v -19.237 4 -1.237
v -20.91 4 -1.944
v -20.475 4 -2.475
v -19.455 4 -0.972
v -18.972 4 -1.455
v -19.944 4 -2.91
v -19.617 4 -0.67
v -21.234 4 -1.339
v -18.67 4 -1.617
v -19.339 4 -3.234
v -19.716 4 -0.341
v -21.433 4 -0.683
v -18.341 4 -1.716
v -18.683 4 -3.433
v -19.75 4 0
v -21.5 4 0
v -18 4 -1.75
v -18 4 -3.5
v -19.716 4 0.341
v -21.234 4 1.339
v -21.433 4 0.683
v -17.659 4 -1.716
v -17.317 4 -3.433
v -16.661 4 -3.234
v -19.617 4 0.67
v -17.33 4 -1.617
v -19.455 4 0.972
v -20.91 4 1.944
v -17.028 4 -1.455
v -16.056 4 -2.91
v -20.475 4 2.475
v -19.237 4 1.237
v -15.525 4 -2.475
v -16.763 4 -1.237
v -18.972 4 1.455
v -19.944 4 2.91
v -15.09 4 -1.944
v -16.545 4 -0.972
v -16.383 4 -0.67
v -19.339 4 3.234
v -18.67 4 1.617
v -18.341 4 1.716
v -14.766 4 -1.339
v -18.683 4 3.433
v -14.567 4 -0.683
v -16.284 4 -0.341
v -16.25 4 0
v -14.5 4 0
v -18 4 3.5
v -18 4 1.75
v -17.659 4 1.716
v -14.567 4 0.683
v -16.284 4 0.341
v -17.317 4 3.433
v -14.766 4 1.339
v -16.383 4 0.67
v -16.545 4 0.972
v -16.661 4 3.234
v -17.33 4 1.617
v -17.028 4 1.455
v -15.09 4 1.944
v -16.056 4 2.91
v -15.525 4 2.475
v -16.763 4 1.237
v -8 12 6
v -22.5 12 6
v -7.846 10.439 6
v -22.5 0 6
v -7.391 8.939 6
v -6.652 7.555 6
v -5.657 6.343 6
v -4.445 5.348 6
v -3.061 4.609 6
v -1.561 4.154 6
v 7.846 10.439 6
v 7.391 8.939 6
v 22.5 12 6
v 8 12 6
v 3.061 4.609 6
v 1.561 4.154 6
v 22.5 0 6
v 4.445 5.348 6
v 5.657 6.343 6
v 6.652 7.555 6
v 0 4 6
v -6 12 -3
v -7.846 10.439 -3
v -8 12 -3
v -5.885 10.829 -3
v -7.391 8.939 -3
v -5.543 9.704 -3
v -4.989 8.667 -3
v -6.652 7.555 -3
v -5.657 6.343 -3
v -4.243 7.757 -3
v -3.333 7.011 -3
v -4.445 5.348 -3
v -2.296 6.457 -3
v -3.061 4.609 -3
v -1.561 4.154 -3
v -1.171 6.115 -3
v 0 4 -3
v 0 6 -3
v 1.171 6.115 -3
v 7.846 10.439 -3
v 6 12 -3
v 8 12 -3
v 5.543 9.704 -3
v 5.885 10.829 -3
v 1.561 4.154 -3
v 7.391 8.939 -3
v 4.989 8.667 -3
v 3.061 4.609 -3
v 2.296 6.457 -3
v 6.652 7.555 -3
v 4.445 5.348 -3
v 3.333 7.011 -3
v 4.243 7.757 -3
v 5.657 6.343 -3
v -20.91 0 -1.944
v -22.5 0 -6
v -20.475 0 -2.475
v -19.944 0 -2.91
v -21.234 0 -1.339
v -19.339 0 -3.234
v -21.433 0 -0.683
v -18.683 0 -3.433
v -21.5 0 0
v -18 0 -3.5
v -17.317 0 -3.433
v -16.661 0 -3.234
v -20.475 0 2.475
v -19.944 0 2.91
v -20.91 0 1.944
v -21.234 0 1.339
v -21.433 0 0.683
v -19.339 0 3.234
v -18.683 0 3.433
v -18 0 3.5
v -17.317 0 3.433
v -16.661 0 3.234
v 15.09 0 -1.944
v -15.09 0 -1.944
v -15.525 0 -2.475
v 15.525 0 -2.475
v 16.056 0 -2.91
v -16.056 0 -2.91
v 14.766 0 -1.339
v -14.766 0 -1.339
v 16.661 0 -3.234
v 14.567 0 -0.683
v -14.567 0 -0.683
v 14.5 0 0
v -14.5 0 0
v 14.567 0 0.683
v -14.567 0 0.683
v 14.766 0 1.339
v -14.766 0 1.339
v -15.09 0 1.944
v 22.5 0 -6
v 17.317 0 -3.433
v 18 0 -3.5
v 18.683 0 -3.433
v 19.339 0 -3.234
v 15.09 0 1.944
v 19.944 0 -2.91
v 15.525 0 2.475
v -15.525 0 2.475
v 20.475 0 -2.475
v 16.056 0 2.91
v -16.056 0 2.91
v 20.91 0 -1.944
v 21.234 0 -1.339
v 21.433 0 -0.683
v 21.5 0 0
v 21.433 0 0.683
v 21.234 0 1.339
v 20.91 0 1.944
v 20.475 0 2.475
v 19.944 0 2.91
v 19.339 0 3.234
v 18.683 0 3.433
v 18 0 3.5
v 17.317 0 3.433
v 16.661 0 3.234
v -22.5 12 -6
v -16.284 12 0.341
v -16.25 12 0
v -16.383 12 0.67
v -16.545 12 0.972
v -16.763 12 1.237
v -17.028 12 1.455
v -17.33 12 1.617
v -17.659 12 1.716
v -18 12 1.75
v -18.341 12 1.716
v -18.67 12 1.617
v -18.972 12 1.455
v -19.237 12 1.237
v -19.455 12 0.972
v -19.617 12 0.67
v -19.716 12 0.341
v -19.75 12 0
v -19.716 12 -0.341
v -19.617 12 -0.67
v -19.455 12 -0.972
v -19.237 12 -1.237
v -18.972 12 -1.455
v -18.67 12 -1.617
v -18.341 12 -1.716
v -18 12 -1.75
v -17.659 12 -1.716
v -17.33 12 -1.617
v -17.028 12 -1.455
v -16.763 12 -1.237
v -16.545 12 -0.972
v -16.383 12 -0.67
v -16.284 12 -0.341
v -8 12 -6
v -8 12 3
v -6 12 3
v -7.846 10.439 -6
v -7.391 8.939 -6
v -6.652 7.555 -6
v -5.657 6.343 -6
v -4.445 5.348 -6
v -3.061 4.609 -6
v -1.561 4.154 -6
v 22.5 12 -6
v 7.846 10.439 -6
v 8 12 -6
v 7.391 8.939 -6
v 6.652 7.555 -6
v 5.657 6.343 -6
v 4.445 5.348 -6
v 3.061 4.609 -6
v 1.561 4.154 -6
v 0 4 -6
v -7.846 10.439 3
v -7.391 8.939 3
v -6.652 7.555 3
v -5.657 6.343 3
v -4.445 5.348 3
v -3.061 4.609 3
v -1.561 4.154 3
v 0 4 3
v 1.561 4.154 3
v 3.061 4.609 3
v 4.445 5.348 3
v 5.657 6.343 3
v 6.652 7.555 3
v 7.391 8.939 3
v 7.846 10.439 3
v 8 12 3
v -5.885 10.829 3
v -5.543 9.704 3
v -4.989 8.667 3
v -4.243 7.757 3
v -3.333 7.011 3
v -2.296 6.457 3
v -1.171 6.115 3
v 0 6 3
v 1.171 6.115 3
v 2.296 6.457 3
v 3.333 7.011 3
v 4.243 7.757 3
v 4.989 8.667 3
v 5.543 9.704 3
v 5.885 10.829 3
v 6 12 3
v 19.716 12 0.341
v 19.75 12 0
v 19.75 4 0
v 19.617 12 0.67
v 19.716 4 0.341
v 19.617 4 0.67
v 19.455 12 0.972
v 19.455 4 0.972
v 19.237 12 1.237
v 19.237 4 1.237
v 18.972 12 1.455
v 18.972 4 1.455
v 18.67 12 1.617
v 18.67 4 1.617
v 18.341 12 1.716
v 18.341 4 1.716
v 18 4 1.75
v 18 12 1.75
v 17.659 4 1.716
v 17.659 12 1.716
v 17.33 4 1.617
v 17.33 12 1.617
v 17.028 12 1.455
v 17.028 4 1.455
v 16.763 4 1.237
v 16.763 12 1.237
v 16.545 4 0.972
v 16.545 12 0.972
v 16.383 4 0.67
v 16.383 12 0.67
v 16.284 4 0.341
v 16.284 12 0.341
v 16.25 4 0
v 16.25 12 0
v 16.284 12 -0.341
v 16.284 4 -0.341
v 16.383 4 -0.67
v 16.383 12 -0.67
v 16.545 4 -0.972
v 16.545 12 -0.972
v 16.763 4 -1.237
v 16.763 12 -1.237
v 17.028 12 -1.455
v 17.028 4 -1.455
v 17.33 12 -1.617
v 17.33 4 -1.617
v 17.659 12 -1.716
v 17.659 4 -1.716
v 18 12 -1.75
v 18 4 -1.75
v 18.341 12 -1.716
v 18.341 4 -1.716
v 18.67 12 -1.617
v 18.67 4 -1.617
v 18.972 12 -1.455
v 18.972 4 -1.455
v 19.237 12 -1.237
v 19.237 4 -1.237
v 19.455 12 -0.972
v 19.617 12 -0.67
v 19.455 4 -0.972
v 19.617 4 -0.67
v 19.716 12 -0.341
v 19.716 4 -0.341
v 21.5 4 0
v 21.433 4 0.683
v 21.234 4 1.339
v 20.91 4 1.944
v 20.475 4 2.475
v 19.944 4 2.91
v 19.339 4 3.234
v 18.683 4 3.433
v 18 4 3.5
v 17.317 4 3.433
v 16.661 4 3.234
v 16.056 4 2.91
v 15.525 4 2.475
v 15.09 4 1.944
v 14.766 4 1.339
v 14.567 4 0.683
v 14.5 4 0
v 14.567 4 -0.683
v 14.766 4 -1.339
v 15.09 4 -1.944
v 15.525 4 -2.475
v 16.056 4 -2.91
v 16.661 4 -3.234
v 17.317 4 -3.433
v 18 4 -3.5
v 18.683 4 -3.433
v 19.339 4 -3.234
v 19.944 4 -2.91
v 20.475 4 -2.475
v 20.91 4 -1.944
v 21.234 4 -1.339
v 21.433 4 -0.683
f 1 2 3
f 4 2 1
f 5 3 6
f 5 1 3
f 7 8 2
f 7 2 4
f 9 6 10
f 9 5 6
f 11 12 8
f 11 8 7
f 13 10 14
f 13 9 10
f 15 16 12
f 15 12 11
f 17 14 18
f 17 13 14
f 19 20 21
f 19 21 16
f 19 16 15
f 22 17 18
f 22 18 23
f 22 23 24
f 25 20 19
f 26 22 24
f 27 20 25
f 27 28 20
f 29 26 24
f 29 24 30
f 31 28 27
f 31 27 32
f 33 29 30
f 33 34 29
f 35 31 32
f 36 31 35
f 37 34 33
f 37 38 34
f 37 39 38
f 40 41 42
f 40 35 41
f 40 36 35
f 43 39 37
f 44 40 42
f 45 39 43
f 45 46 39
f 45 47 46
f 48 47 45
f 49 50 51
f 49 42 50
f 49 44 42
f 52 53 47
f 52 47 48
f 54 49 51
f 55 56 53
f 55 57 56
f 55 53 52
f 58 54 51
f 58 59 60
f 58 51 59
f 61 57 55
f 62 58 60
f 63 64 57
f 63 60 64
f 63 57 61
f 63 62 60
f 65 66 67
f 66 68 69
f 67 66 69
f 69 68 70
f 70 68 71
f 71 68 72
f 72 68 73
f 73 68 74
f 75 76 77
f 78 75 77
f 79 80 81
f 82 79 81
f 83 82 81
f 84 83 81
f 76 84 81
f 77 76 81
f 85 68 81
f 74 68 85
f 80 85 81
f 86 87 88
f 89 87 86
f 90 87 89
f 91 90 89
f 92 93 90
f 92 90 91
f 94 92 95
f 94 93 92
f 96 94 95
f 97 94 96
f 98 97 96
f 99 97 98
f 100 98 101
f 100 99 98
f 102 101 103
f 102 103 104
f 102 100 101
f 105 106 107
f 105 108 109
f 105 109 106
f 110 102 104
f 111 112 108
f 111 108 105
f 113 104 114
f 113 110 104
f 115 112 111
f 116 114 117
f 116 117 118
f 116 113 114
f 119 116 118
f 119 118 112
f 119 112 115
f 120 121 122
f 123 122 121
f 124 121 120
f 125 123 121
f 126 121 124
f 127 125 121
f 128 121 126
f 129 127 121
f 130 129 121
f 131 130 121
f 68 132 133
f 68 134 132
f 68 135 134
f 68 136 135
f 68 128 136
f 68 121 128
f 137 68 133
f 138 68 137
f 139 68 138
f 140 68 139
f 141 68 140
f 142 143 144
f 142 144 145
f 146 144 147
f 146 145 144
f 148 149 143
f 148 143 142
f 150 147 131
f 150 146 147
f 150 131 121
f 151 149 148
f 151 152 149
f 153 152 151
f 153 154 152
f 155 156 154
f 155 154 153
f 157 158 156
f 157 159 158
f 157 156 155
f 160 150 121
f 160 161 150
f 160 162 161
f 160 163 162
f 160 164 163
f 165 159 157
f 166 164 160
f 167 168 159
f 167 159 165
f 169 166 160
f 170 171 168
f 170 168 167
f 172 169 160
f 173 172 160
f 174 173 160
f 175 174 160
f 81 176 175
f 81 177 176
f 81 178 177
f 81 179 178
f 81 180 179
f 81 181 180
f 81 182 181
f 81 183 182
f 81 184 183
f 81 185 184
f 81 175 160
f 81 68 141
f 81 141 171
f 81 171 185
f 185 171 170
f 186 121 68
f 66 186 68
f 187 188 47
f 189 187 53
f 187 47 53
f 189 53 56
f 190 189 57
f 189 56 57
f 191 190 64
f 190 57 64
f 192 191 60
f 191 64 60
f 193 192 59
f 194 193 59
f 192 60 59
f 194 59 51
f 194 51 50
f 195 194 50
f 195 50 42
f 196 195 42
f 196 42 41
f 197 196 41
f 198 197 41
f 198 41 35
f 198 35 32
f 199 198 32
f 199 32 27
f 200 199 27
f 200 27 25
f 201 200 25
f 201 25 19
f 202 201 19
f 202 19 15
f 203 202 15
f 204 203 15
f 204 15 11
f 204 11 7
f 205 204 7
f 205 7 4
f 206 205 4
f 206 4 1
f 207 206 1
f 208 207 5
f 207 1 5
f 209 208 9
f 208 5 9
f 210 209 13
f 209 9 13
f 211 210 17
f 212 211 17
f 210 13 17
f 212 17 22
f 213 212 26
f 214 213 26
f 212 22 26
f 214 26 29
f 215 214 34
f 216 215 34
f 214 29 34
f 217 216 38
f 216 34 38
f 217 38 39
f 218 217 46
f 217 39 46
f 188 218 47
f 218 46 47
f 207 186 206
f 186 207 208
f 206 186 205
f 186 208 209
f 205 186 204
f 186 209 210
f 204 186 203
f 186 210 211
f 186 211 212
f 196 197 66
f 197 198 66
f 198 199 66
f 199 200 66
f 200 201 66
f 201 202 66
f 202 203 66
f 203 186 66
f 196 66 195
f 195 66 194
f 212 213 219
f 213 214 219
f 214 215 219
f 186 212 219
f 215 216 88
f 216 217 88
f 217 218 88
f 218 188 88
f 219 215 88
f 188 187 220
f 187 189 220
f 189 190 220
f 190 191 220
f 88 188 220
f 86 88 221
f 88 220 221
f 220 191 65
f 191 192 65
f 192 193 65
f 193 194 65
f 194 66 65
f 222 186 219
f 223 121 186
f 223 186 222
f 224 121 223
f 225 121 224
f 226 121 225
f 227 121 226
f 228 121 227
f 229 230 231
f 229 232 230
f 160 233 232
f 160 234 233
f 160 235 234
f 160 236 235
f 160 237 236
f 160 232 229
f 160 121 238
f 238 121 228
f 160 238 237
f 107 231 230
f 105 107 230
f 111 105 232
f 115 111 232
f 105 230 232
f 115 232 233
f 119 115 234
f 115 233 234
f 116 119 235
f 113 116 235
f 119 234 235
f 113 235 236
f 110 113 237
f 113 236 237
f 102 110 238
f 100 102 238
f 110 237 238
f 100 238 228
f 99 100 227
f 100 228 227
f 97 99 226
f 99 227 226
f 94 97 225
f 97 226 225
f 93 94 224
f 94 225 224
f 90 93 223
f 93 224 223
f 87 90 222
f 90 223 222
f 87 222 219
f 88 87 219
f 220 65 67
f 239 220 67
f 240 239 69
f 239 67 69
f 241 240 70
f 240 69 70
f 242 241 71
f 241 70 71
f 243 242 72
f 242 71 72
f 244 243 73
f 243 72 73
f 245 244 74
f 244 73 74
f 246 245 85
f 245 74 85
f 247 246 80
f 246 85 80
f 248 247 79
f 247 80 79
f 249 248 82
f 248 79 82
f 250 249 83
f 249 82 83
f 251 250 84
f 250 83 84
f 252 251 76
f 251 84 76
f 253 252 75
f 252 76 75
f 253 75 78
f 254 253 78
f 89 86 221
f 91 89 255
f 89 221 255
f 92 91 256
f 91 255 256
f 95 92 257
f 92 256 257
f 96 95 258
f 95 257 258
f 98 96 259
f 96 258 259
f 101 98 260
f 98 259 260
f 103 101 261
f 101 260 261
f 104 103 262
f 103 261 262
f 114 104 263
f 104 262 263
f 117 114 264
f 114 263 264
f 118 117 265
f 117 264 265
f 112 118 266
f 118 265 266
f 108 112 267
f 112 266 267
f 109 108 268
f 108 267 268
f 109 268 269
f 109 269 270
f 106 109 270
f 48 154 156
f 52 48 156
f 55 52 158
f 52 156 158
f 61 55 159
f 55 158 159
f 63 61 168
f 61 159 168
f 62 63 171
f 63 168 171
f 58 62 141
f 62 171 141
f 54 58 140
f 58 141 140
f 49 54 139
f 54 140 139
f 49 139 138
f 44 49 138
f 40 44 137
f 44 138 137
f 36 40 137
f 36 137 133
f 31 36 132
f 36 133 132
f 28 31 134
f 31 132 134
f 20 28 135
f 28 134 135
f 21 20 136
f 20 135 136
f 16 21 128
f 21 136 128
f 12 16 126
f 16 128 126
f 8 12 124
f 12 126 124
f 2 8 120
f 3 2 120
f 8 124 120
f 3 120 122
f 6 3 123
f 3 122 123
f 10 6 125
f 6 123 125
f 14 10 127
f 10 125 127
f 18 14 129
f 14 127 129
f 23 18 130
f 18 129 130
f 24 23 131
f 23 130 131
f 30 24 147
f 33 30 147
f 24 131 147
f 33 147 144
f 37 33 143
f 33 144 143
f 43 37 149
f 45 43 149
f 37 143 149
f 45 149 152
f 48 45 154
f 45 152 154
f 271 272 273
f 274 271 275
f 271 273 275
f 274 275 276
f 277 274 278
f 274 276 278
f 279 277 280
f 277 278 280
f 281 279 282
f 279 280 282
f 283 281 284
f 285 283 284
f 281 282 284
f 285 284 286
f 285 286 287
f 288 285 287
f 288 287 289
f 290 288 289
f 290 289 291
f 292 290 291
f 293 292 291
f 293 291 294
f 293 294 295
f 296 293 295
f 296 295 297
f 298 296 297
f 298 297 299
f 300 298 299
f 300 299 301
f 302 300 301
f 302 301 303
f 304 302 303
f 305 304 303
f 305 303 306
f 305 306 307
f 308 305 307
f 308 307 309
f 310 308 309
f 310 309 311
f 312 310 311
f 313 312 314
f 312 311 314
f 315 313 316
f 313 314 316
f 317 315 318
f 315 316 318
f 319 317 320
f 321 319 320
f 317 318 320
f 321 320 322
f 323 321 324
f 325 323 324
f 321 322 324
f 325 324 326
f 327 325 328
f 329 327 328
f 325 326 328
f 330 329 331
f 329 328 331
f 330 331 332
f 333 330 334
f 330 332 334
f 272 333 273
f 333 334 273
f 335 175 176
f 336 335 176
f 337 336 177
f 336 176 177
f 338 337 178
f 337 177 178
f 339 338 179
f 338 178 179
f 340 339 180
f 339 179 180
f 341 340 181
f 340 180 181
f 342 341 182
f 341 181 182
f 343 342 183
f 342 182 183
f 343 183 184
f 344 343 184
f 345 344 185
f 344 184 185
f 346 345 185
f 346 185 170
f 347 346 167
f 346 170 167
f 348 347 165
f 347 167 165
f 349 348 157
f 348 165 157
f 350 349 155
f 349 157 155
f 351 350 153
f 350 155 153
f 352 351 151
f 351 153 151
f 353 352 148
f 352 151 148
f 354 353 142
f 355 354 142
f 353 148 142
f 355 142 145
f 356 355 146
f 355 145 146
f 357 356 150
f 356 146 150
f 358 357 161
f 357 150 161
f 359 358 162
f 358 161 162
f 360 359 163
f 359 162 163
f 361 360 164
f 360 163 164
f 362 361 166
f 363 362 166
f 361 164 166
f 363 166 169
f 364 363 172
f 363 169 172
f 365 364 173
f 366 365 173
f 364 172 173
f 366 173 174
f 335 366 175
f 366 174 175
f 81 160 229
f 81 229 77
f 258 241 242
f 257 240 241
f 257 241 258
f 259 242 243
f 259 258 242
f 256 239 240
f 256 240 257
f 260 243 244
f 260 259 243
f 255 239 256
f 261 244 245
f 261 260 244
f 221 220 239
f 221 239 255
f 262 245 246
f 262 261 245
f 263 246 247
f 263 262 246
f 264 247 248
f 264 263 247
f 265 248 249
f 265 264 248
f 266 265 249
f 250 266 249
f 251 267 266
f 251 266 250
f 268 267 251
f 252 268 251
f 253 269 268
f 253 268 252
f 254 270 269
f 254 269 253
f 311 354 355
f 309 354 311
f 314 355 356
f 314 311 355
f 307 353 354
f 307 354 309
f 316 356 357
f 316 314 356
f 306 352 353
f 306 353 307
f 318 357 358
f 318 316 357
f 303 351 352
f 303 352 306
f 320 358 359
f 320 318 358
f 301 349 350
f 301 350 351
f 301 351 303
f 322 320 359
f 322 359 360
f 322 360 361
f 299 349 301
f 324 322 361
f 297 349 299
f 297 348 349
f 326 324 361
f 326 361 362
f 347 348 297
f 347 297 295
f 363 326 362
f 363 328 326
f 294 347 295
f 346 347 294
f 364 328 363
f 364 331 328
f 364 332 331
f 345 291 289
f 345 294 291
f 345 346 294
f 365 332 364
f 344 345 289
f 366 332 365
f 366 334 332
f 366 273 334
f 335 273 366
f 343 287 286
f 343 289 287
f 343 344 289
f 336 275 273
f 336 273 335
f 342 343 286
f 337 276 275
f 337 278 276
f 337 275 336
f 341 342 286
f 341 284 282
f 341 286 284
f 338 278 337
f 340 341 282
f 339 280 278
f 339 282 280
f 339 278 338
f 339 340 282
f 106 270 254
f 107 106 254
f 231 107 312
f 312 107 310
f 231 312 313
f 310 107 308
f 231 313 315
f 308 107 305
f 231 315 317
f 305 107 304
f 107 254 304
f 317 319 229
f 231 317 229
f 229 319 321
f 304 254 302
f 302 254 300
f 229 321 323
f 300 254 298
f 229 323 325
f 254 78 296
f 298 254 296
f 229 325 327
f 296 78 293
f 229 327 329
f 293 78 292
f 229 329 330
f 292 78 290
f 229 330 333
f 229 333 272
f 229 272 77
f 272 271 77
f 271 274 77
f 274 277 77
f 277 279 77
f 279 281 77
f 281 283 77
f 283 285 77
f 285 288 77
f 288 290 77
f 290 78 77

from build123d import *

# Parameters (mm, degrees)
F0_W     = 45
F0_H     = 12
F0_R     = 3.5
F0_R_2   = 1.75
F1_DEPTH = 12
F2_DEPTH = 4
F4_DEPTH = 12.001
F3_R     = 8
F3_R_2   = 6
F5_DEPTH = 3
F6_R     = 8
F7_DEPTH = 3


with BuildPart() as f1:
    # F0 (on Front) → F1 (new body)
    with BuildSketch(Plane.XZ):
        Rectangle(F0_W, F0_H)
        with Locations((-18, 0)):
            Circle(F0_R, mode=Mode.SUBTRACT)
        with Locations((18, 0)):
            Circle(F0_R, mode=Mode.SUBTRACT)
        with Locations((-18, 0)):
            Circle(F0_R)
        with Locations((-18, 0)):
            Circle(F0_R_2, mode=Mode.SUBTRACT)
        with Locations((18, 0)):
            Circle(F0_R)
        with Locations((18, 0)):
            Circle(F0_R_2, mode=Mode.SUBTRACT)
    extrude(amount=-F1_DEPTH)

    # F0 (on Front) → F2 (cut)
    with BuildSketch(Plane.XZ):
        with Locations((-18, 0)):
            Circle(F0_R)
        with Locations((-18, 0)):
            Circle(F0_R_2, mode=Mode.SUBTRACT)
        with Locations((18, 0)):
            Circle(F0_R)
        with Locations((18, 0)):
            Circle(F0_R_2, mode=Mode.SUBTRACT)
    extrude(amount=-F2_DEPTH, mode=Mode.SUBTRACT)

    # F3 (on face) → F4 (cut, through all)
    with BuildSketch(Plane.XY.offset(6)):
        with BuildLine():
            Line((-6, 12), (6, 12))
            ThreePointArc((6, 12), (0, 18), (-6, 12))
        make_face()
        with BuildLine():
            ThreePointArc((-6, 12), (0, 6), (6, 12))
            Line((6, 12), (-6, 12))
        make_face()
    extrude(amount=-F4_DEPTH, mode=Mode.SUBTRACT)

    # F3 (on face) → F5 (cut)
    with BuildSketch(Plane.XY.offset(6)):
        with Locations((0, 12)):
            Circle(F3_R)
        with Locations((0, 12)):
            Circle(F3_R_2, mode=Mode.SUBTRACT)
    extrude(amount=-F5_DEPTH, mode=Mode.SUBTRACT)

    # F6 (on face) → F7 (cut)
    with BuildSketch(Plane(origin=(0, 0, -6), x_dir=(1, 0, 0), z_dir=(0, 0, -1))):
        with Locations((0, -12)):
            Circle(F6_R)
    extrude(amount=-F7_DEPTH, mode=Mode.SUBTRACT)


solid = f1.part
